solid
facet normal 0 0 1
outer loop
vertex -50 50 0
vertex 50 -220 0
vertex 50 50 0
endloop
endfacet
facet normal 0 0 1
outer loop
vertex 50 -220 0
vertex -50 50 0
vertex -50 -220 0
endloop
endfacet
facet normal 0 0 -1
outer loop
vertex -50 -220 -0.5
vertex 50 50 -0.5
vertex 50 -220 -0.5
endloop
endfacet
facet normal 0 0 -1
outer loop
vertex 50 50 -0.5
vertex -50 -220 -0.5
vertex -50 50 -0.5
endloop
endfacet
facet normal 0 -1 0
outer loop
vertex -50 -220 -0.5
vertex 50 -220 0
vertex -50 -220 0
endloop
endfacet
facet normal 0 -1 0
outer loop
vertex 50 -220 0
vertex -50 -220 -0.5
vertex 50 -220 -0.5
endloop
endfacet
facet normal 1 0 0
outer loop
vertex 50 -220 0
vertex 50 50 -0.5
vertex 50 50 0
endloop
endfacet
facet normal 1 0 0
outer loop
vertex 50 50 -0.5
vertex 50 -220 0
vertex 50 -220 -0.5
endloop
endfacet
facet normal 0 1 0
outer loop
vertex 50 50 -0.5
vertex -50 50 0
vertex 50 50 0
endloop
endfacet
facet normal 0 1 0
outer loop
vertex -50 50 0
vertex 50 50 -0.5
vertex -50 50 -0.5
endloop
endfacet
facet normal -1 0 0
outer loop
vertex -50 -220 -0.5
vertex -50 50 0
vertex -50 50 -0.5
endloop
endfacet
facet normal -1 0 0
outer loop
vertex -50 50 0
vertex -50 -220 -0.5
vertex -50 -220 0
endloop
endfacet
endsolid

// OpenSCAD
// Flat, quiet melee validation fixture including the default NextDayz spawn.
color([0.24, 0.30, 0.22])
    translate([-50, -220, -0.5]) cube([100, 270, 0.5]);
